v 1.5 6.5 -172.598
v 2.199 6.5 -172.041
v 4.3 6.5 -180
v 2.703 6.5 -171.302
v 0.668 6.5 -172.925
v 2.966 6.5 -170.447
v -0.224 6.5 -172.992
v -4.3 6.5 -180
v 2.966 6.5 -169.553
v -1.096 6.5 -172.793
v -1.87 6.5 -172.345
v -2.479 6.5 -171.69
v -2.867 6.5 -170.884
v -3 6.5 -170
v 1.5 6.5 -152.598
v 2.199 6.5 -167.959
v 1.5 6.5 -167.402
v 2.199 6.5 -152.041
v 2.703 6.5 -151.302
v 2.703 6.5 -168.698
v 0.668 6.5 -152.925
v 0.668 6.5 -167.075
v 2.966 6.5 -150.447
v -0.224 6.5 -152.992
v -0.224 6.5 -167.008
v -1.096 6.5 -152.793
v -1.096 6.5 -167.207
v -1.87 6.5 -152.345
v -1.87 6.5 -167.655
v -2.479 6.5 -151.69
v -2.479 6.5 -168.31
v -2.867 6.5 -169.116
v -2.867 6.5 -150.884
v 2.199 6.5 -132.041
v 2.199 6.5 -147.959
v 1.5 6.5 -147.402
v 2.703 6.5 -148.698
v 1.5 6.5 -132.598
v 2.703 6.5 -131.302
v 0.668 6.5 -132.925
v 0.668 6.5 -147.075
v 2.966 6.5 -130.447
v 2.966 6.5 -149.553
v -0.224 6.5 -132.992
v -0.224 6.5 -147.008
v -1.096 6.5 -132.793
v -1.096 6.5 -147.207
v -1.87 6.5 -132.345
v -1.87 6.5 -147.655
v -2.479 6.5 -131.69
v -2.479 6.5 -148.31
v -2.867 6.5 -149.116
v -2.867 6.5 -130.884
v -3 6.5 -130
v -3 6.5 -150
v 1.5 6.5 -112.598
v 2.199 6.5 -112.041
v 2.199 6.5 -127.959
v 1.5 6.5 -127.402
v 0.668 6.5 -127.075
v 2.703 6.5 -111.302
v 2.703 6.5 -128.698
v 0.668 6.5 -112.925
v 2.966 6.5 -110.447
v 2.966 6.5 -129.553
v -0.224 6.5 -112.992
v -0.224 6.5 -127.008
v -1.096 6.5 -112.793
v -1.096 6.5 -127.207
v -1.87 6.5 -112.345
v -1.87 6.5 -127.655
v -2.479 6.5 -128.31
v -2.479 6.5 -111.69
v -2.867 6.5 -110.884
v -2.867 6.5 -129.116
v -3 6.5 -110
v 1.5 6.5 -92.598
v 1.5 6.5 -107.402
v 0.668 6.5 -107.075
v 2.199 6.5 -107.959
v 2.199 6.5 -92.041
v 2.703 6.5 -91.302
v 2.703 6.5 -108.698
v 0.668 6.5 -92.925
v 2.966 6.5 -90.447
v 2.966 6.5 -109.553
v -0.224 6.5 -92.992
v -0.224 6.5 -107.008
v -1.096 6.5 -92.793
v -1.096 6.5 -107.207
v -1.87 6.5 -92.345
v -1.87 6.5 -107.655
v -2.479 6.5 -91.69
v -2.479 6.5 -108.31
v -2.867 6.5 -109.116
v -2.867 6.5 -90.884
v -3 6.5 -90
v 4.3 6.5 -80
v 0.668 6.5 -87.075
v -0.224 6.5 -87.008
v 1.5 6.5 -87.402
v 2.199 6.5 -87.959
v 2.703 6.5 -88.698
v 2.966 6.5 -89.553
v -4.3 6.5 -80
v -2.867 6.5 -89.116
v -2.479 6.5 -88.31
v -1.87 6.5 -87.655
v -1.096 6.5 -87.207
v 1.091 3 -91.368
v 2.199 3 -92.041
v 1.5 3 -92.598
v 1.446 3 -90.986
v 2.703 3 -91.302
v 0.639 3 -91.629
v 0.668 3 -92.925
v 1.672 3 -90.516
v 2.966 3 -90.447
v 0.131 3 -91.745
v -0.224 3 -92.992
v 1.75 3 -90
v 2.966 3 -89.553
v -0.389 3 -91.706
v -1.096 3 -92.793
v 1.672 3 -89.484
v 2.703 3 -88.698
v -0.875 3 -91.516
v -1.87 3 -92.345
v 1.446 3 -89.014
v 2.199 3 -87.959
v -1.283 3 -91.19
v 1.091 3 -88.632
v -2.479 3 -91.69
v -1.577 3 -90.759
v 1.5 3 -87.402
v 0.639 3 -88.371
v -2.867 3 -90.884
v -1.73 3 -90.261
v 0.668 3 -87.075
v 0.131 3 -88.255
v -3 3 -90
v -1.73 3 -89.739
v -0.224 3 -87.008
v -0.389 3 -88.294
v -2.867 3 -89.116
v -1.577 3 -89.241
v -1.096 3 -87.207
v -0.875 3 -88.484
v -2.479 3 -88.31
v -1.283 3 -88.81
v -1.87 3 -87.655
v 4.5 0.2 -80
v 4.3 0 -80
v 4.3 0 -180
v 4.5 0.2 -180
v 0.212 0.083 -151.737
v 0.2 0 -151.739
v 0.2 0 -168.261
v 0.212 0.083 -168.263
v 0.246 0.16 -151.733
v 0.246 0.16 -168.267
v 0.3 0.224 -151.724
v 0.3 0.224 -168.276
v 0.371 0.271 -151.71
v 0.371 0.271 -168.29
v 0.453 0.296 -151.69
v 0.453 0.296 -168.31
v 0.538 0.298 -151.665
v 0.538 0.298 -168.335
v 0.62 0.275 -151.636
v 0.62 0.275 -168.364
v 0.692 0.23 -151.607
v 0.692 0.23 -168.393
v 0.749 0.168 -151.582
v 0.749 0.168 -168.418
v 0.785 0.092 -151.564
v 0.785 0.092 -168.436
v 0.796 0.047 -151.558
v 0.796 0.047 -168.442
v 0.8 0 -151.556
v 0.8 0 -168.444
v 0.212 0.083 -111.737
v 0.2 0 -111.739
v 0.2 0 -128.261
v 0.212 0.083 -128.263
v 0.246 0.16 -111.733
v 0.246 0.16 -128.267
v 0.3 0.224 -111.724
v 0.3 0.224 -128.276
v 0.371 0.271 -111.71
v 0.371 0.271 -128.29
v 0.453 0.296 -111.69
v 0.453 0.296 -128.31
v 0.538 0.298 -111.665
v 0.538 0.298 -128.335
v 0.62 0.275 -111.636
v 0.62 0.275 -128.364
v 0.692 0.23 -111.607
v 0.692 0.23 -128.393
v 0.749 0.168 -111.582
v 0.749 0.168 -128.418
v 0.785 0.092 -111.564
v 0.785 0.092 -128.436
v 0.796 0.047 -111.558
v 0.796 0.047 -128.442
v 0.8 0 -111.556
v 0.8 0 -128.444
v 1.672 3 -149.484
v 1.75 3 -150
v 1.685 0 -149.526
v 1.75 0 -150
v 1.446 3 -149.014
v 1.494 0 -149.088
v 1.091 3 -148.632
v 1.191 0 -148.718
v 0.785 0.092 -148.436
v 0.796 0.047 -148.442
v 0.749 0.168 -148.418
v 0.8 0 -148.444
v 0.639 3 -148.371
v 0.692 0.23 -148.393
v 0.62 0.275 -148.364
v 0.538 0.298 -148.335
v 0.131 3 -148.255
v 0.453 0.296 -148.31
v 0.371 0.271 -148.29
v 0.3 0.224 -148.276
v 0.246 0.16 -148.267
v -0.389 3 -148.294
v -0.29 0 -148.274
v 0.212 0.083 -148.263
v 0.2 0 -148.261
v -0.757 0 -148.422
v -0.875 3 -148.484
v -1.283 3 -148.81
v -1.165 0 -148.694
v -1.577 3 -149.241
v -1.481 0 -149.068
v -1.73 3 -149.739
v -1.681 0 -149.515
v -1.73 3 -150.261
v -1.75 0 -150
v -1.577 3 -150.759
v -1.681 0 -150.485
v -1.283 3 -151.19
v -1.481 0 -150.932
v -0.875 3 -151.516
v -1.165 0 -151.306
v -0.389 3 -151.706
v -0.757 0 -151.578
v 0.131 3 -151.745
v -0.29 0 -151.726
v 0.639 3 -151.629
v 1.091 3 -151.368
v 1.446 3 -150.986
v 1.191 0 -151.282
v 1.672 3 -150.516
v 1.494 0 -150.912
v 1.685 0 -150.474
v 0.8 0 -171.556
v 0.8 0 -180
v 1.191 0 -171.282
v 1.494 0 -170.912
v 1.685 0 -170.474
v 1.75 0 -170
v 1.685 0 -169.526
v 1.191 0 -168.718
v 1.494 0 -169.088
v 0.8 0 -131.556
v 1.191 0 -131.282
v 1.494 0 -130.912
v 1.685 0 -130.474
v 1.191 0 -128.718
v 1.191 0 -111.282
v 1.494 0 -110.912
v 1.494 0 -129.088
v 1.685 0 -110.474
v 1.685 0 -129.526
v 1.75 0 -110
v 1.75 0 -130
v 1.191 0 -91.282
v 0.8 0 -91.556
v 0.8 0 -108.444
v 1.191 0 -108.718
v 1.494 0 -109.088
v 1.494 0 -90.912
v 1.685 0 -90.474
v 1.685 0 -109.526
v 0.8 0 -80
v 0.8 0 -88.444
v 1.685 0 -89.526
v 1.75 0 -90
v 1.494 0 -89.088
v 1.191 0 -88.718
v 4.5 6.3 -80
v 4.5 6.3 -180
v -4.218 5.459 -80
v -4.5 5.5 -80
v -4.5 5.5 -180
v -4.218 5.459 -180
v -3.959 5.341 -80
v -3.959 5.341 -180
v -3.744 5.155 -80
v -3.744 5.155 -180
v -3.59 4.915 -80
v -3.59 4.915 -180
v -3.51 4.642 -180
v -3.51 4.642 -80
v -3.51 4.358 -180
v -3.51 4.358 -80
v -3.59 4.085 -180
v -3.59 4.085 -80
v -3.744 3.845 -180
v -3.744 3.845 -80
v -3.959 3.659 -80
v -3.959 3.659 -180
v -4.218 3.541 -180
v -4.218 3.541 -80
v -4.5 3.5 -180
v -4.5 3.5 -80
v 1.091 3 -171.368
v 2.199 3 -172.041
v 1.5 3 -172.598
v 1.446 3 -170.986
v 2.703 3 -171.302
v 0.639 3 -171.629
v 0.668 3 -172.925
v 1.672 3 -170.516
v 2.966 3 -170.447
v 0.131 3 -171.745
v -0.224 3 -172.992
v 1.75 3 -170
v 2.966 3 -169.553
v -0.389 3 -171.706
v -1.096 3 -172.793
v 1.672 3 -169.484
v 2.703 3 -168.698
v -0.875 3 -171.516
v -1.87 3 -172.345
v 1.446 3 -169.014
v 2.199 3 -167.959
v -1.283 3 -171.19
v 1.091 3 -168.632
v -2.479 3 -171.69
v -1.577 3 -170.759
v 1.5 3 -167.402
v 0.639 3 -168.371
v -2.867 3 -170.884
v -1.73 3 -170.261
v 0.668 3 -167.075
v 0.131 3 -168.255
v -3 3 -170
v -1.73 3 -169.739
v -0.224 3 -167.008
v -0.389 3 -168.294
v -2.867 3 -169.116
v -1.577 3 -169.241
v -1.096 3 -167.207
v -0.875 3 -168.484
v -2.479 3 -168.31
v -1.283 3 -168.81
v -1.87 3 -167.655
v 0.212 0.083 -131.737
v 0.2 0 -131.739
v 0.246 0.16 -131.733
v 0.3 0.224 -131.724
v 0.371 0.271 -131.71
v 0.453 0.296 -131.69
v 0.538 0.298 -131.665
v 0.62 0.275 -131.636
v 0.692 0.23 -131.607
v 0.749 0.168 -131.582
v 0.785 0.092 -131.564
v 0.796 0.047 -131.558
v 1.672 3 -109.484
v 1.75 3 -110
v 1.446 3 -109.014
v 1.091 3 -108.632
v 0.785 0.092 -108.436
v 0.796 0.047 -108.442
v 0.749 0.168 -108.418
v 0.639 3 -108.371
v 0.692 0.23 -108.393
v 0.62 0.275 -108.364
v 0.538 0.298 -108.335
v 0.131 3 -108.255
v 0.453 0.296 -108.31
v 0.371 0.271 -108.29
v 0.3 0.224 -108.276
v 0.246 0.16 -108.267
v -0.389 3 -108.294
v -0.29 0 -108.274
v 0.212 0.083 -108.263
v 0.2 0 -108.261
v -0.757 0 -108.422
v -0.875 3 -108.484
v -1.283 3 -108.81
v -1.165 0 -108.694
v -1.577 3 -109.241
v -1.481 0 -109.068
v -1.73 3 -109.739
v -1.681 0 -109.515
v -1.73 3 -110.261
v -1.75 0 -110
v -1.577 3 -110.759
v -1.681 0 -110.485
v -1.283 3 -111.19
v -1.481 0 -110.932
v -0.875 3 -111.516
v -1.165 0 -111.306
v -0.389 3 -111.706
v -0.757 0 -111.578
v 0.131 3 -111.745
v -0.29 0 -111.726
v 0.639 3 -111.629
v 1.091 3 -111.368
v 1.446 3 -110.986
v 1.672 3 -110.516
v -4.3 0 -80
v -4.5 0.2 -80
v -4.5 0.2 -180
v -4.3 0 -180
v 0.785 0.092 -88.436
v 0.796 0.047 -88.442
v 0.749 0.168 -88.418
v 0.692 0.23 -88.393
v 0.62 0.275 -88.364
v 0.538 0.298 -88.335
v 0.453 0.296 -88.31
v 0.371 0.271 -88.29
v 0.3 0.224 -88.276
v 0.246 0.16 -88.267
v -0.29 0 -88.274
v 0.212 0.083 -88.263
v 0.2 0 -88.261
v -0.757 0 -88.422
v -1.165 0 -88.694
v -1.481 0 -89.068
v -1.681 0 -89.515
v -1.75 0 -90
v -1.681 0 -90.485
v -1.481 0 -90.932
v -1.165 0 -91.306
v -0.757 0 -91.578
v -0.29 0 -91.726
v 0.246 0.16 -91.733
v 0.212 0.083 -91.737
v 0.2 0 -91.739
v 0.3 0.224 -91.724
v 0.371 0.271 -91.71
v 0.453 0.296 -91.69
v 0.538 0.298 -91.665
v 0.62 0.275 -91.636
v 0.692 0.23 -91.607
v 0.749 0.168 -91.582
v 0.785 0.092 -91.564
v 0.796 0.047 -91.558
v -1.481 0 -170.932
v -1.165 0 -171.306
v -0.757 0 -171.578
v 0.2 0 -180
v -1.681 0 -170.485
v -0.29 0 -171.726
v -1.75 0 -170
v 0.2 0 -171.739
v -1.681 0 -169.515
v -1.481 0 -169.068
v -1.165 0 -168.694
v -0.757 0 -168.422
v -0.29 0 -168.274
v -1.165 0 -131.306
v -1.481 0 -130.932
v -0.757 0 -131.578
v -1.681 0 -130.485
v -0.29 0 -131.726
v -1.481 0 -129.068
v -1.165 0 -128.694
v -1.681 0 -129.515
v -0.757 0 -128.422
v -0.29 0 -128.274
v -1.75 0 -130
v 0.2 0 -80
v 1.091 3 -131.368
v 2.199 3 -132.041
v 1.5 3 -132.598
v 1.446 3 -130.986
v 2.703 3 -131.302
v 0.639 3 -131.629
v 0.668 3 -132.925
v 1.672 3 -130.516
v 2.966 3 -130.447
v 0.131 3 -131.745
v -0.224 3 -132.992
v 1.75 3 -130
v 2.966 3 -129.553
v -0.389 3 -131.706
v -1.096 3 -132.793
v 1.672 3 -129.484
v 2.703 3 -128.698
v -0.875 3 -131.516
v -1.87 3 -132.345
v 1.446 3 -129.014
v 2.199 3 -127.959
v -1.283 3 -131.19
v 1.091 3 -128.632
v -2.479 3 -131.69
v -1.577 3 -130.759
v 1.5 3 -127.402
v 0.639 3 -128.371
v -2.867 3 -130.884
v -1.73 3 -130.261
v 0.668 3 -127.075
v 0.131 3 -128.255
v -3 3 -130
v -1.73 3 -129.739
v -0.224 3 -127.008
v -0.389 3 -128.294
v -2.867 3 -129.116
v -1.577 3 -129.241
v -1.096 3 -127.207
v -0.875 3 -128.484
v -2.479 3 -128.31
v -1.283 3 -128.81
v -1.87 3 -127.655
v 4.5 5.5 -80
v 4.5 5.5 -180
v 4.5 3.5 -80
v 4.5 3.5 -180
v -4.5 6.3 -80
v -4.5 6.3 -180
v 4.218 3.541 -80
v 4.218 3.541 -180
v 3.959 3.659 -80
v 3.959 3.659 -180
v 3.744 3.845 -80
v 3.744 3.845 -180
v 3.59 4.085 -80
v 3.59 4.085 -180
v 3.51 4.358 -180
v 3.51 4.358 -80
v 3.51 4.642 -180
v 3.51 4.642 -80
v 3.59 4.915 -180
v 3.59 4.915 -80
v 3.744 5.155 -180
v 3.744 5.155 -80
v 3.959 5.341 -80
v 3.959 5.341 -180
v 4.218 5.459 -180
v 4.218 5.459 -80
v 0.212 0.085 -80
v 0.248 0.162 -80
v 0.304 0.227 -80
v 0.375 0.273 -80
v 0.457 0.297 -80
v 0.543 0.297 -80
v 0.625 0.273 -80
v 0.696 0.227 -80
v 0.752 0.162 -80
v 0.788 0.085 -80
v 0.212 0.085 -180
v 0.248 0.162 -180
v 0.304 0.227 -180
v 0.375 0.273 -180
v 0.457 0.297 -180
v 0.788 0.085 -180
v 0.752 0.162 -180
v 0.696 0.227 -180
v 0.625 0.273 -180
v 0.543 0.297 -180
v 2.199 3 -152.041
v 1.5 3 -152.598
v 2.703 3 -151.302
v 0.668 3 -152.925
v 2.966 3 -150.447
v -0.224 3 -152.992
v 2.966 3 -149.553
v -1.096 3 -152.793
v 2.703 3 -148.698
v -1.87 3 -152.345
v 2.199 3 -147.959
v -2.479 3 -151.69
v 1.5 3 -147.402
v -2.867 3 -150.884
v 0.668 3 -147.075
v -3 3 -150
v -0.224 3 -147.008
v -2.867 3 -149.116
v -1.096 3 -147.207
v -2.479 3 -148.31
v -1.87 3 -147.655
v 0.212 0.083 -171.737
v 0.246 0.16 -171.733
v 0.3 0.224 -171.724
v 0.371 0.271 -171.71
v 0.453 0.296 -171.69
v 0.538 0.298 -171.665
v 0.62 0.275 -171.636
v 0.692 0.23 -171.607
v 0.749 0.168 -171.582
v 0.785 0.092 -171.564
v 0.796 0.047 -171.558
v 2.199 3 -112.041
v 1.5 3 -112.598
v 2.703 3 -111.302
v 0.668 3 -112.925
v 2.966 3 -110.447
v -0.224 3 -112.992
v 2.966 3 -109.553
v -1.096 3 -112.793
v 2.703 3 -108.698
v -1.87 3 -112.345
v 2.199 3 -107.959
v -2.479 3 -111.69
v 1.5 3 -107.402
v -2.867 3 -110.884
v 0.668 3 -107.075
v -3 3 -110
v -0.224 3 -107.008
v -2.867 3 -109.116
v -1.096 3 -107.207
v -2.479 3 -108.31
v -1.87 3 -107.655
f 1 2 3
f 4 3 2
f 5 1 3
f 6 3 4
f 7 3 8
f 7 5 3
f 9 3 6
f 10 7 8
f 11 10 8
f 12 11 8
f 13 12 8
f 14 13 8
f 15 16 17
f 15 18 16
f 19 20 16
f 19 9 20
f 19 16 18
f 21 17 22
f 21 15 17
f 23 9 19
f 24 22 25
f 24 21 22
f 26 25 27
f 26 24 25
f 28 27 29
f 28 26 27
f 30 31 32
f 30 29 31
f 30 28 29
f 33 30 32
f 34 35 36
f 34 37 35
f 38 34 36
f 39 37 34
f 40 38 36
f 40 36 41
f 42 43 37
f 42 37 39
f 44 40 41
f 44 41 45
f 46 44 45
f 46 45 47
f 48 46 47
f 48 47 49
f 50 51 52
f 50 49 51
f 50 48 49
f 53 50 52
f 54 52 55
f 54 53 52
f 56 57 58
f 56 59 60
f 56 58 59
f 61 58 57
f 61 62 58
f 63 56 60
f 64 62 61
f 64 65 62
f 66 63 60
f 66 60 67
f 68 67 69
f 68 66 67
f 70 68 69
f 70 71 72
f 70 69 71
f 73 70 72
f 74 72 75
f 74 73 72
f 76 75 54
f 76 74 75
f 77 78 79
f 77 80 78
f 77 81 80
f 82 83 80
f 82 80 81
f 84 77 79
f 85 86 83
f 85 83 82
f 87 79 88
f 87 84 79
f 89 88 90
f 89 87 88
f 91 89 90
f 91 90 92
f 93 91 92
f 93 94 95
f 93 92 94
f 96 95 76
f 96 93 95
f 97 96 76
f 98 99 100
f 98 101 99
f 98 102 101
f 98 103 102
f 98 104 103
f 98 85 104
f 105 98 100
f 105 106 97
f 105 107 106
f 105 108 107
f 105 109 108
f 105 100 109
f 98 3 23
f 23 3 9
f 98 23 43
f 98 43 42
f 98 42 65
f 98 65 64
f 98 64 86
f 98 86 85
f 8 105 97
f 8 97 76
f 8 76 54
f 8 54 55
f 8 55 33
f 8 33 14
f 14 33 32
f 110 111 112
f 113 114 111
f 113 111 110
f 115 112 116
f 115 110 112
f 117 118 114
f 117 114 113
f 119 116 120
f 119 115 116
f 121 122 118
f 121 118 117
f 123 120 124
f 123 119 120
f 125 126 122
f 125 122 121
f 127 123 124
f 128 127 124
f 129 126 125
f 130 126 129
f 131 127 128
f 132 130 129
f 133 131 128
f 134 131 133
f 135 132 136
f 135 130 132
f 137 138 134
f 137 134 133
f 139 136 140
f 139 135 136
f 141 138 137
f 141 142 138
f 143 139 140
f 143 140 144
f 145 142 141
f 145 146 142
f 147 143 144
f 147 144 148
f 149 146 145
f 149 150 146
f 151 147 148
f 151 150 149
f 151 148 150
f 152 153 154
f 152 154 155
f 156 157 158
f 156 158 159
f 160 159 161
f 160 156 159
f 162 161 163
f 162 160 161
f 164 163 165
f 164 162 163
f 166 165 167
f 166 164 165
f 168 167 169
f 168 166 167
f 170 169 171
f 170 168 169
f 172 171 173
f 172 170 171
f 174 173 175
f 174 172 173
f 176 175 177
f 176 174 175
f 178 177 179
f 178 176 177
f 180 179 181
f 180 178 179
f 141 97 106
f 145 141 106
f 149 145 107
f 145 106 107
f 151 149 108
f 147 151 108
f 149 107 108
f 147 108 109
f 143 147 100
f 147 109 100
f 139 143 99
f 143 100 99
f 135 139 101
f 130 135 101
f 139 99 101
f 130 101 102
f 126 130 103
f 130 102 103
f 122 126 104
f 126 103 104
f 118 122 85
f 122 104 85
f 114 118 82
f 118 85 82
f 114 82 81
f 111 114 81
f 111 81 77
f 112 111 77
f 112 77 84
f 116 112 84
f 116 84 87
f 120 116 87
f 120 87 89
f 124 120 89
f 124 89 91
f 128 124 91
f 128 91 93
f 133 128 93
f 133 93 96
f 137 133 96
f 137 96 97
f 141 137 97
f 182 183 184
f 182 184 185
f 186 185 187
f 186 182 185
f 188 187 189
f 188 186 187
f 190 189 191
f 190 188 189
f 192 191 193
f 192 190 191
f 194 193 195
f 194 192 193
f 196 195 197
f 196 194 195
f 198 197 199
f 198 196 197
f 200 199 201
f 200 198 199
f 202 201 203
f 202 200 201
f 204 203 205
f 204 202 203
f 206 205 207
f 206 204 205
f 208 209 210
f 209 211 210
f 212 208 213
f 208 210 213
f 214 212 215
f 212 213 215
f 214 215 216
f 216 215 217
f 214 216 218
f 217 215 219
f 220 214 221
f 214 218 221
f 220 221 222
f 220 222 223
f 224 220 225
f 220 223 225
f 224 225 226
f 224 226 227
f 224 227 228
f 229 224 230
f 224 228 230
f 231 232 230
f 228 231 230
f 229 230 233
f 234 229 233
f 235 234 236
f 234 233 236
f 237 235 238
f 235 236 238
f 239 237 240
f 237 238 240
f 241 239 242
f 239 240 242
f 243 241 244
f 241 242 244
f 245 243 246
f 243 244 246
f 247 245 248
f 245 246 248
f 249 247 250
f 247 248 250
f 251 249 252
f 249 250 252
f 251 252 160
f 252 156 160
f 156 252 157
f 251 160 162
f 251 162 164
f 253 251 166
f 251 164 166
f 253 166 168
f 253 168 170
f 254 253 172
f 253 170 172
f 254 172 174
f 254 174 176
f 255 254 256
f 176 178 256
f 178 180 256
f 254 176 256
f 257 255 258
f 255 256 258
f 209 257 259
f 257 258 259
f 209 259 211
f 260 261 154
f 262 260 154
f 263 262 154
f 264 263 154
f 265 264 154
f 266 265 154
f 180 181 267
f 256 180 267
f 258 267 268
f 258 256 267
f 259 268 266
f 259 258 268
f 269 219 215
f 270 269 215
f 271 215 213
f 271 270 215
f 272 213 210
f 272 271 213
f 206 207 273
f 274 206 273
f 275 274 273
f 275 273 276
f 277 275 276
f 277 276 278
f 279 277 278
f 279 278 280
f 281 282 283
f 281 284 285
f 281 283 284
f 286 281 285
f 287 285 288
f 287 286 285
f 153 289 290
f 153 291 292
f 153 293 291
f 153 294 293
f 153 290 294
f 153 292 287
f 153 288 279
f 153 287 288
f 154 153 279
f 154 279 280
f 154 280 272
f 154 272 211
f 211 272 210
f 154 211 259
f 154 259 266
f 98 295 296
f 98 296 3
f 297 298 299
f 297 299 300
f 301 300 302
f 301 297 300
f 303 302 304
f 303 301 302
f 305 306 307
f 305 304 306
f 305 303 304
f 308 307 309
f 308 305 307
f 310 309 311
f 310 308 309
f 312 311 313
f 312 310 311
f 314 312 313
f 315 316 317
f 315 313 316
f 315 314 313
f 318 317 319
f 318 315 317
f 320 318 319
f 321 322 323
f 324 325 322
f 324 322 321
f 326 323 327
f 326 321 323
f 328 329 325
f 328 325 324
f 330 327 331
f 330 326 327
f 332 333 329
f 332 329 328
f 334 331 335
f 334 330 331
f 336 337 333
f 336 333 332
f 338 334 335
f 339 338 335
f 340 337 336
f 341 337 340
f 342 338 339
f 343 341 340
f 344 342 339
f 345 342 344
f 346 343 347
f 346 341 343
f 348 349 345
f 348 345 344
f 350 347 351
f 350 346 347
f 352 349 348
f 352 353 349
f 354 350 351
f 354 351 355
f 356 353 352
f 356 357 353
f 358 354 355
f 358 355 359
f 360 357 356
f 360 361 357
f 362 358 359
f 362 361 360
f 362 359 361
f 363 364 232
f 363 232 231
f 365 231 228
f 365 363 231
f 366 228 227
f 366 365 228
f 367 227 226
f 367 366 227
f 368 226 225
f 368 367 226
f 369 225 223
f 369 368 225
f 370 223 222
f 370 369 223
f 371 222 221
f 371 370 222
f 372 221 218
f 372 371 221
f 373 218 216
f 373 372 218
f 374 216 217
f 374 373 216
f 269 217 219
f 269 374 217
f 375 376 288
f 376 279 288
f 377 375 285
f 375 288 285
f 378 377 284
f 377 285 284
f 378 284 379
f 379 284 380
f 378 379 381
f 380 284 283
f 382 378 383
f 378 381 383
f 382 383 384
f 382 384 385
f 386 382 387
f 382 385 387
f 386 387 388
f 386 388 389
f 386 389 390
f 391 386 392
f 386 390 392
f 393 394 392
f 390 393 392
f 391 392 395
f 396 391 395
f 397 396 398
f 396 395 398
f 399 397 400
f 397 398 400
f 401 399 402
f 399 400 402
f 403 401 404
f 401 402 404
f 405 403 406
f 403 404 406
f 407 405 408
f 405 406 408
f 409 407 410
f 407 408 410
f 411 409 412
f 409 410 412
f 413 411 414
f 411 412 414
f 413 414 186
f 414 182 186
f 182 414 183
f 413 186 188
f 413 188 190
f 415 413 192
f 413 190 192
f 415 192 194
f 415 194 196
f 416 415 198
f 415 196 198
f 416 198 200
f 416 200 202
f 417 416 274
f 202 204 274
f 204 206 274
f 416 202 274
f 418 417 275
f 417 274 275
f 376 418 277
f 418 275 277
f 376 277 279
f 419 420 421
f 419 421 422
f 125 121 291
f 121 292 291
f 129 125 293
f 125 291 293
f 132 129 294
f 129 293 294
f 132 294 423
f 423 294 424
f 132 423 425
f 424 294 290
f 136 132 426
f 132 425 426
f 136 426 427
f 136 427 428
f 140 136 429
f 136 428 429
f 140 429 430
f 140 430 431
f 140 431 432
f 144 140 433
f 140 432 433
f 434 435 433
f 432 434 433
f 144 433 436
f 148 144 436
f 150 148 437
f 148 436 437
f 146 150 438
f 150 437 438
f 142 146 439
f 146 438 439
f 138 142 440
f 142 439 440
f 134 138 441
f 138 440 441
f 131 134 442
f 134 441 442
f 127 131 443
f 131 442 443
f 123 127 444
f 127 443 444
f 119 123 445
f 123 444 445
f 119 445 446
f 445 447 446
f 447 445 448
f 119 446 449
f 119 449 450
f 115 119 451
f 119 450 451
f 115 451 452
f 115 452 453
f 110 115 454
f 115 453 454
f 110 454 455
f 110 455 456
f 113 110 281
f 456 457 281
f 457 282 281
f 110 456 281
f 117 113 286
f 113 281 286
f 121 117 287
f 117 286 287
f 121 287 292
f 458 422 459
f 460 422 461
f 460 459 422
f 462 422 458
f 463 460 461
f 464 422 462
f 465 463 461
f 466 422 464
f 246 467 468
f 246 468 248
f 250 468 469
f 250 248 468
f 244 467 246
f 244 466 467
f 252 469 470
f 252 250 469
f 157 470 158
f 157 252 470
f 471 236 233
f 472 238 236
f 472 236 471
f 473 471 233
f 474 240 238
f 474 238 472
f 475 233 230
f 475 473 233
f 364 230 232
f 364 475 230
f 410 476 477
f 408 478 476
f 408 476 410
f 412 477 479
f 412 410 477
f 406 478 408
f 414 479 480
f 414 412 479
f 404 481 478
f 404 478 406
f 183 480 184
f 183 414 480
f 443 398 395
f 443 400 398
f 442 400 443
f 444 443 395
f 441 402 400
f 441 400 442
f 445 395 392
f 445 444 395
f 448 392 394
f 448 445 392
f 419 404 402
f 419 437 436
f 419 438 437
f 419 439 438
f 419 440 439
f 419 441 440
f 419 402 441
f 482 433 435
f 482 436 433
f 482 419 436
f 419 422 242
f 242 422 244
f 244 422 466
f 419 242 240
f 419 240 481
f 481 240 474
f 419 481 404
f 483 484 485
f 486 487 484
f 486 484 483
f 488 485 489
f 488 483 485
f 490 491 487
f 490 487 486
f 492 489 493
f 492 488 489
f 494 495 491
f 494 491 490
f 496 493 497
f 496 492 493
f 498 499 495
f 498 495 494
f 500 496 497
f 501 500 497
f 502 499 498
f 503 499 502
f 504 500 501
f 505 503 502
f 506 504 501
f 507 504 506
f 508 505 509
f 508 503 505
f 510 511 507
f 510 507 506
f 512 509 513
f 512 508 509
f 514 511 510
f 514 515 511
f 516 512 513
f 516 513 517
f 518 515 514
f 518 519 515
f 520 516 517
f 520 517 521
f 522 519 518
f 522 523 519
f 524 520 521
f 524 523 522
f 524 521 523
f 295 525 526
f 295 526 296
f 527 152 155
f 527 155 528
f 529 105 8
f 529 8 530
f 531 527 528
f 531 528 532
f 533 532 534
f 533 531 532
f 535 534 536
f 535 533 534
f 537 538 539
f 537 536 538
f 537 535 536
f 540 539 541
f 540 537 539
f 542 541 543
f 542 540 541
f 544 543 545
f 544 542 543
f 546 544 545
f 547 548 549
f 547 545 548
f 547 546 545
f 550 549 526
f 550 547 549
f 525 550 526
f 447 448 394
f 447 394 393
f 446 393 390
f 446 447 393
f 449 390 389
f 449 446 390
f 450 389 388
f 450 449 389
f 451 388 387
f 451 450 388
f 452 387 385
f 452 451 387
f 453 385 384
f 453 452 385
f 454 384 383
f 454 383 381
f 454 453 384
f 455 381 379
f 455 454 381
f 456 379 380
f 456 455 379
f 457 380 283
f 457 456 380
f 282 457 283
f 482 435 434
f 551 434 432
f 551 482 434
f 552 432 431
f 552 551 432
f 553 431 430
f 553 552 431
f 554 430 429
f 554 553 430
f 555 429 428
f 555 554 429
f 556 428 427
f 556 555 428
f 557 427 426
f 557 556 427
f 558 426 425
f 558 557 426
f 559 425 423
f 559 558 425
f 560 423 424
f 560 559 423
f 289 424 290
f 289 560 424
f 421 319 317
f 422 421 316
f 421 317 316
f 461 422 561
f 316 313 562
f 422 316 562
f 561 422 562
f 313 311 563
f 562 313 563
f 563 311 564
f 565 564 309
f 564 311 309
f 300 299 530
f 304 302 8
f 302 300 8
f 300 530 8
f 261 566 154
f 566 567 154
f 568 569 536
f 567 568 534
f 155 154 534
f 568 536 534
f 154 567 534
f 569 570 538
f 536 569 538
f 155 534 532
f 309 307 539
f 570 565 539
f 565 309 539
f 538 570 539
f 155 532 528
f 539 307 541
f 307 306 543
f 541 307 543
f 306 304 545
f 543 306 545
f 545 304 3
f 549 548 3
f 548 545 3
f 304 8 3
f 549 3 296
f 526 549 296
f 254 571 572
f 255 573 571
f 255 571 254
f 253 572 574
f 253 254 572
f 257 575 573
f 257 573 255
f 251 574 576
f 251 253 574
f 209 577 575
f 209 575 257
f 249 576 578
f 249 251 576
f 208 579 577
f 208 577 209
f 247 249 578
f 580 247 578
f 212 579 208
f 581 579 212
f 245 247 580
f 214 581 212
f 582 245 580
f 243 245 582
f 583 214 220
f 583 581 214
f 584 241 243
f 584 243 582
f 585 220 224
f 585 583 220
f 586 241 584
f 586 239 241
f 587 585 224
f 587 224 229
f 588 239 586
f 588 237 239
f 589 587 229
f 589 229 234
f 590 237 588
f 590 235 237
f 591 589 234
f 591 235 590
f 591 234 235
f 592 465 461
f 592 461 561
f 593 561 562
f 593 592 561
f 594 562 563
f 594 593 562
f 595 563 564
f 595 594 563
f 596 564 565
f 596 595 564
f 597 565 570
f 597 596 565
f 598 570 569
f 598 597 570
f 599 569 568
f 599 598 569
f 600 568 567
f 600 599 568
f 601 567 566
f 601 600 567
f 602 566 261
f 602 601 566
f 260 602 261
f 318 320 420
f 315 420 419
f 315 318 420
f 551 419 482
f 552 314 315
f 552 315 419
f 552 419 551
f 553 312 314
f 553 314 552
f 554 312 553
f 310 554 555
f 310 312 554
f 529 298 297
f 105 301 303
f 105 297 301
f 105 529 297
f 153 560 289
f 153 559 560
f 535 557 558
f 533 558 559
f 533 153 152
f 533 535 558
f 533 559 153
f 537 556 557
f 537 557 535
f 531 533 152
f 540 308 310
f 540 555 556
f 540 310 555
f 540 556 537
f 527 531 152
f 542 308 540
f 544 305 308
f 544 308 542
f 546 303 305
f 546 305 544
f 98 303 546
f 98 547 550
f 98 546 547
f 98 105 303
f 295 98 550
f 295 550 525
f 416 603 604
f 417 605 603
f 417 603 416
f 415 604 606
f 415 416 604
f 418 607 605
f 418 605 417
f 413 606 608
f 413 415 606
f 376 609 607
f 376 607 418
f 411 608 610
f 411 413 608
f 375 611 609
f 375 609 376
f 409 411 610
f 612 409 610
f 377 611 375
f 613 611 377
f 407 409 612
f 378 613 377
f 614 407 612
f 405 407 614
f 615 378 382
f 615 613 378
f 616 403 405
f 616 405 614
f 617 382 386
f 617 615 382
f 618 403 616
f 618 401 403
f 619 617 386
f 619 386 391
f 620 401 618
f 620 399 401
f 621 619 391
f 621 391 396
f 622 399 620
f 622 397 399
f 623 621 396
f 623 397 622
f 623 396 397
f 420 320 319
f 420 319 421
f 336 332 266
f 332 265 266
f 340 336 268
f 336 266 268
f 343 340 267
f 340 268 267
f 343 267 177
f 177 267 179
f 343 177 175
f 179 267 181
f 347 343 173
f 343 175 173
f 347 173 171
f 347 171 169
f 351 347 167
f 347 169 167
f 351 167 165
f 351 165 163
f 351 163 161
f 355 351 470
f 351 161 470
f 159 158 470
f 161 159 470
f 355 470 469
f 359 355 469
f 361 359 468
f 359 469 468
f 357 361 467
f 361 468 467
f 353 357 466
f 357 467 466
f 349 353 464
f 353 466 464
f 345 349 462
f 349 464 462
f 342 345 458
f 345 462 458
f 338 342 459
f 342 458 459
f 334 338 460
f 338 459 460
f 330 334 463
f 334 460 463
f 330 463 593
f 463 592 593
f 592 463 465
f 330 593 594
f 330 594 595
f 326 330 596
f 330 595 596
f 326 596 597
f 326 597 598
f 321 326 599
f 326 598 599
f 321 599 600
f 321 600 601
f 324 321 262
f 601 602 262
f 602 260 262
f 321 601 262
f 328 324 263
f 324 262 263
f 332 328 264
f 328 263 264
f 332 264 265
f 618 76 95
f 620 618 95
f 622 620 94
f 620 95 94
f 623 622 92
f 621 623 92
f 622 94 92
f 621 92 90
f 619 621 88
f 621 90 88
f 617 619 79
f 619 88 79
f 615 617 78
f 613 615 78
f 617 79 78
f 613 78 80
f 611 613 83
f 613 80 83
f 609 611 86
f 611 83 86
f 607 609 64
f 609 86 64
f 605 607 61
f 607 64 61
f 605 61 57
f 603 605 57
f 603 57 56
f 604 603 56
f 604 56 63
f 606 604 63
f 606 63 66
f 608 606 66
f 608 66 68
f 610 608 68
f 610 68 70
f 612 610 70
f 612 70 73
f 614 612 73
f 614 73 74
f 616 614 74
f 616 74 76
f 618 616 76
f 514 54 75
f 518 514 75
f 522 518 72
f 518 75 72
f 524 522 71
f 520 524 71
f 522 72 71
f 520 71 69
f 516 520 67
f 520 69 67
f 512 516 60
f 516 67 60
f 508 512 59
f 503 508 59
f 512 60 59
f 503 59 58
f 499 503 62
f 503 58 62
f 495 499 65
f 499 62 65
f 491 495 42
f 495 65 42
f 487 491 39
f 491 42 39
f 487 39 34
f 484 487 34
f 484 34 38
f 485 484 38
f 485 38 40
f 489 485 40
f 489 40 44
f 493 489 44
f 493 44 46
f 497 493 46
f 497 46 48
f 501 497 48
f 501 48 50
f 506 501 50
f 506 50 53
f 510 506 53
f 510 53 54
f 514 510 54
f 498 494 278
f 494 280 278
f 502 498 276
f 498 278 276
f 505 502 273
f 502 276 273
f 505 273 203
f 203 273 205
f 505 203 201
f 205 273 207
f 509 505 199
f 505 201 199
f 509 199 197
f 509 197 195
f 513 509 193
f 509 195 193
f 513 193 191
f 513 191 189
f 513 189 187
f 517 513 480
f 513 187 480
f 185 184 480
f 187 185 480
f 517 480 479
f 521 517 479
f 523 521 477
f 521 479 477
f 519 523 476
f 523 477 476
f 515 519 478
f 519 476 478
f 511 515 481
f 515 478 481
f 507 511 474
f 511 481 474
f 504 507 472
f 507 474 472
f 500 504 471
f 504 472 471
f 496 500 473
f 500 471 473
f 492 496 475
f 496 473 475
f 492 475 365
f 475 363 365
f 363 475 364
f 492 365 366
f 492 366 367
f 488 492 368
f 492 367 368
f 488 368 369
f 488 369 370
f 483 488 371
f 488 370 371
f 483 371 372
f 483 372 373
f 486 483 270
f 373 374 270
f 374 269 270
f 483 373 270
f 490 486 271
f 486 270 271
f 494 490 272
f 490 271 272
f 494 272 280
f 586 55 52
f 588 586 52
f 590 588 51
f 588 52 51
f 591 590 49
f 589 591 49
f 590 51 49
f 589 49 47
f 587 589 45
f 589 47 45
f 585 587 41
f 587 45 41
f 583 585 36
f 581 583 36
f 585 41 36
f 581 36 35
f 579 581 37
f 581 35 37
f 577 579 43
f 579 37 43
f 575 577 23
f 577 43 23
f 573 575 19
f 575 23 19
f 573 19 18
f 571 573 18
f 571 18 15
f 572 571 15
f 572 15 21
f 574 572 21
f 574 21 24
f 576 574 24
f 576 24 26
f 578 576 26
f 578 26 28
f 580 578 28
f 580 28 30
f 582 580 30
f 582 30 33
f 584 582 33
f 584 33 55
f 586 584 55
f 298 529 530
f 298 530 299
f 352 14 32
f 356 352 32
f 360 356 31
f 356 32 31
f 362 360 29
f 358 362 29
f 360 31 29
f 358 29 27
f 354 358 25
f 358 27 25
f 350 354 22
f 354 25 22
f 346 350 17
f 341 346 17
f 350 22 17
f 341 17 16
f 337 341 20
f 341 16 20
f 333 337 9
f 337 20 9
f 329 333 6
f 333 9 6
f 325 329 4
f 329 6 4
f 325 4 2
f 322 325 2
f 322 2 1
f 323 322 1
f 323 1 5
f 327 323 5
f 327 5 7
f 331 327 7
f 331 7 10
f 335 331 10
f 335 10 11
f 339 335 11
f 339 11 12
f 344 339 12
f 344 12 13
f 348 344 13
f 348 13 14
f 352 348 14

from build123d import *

# Parameters (mm, degrees)
EXTRUDE_1_DEPTH              = 220
HOLE_WIZARD_M3_1_D           = 3.5
HOLE_WIZARD_M3_1_CBORE_D     = 6
HOLE_WIZARD_M3_1_CBORE_DEPTH = 3.5
PATTERN_LINEAR_1_COUNT       = 11
PATTERN_LINEAR_1_PITCH       = 20
SKETCH_6_W                   = 1.5
SKETCH_6_H                   = 0.134615385
CUT_EXTRUDE_1_DEPTH          = 0.1
SKETCH_8_W                   = 50
SKETCH_8_H                   = 60
SKETCH_8_H_2                 = 140
CUT_EXTRUDE_2_DEPTH          = 221.14199973


with BuildPart() as part:
    # 草图1 → 凸台-拉伸1 (new body)
    with BuildSketch(Plane.XY):
        with BuildLine():
            Line((4.5, 5.5), (4.5, 6.3))
            Line((4.5, 6.3), (4.3, 6.5))
            Line((4.3, 6.5), (-4.3, 6.5))
            Line((-4.3, 6.5), (-4.5, 6.3))
            Line((-4.5, 6.3), (-4.5, 5.5))
            ThreePointArc((-4.5, 5.5), (-3.5, 4.5), (-4.5, 3.5))
            Line((-4.5, 3.5), (-4.5, 0.2))
            Line((-4.5, 0.2), (-4.3, 0))
            Line((-4.3, 0), (0.2, 0))
            ThreePointArc((0.2, 0), (0.5, 0.3), (0.8, 0))
            Line((0.8, 0), (4.3, 0))
            Line((4.3, 0), (4.5, 0.2))
            Line((4.5, 0.2), (4.5, 3.5))
            ThreePointArc((4.5, 3.5), (3.5, 4.5), (4.5, 5.5))
        make_face()
    extrude(amount=-EXTRUDE_1_DEPTH)

    # M3 六角凹头螺钉的柱形沉头孔1 (through all)
    with Locations(Plane(origin=(0.754900713, 6.5, 19.343475793), x_dir=(-1, 0, 0), z_dir=(0, 1, 0))):
        with Locations((0.754900713, -29.343475793)):
            hole_wizard_m3_1 = CounterBoreHole(HOLE_WIZARD_M3_1_D / 2, HOLE_WIZARD_M3_1_CBORE_D / 2, HOLE_WIZARD_M3_1_CBORE_DEPTH)

    # 阵列(线性)1: M3 六角凹头螺钉的柱形沉头孔1 ×11
    with Locations(*[(0, 0, -i * PATTERN_LINEAR_1_PITCH) for i in range(1, PATTERN_LINEAR_1_COUNT)]):
        add(hole_wizard_m3_1, mode=Mode.SUBTRACT)

    # 草图6 → 切除-拉伸1 (cut)
    # profile 1 of 9: a face of its own
    with BuildSketch(Plane(origin=(0, 6.5, 0), x_dir=(1, 0, 0), z_dir=(0, 1, 0))):
        Polygon((-1.5, 13.740384615), (-1.5, 13.875), (-0.884615385, 13.875), (-0.884615385, 14.644230769), (-1.5, 14.644230769), (-1.5, 14.778846154), (0, 14.778846154), (0, 14.644230769), (-0.730769231, 14.644230769), (-0.730769231, 13.875), (0, 13.875), (0, 13.740384615), align=None)
    # profile 2 of 9: a face of its own
    with BuildSketch(Plane(origin=(0, 6.5, 0), x_dir=(1, 0, 0), z_dir=(0, 1, 0))):
        with Locations((-0.75, 15.230769231)):
            Rectangle(SKETCH_6_W, SKETCH_6_H)
    # profile 3 of 9: a face of its own
    with BuildSketch(Plane(origin=(0, 6.5, 0), x_dir=(1, 0, 0), z_dir=(0, 1, 0))):
        Polygon((-1.5, 15.528846154), (-1.5, 15.66796875), (-0.399939904, 15.961538462), (-1.5, 16.398137019), (-1.5, 16.417668269), (-0.407451923, 16.846153846), (-1.5, 17.141225962), (-1.5, 17.278846154), (0, 16.874399038), (0, 16.855168269), (-1.147235577, 16.403846154), (0, 15.947115385), (0, 15.927884615), align=None)
    # profile 4 of 9: a face of its own
    with BuildSketch(Plane(origin=(0, 6.5, 0), x_dir=(1, 0, 0), z_dir=(0, 1, 0))):
        with Locations((-0.75, 17.692307693)):
            Rectangle(SKETCH_6_W, SKETCH_6_H)
    # profile 5 of 9: a face of its own
    with BuildSketch(Plane(origin=(0, 6.5, 0), x_dir=(1, 0, 0), z_dir=(0, 1, 0))):
        Polygon((0, 18.086538462), (-1.5, 18.086538462), (-1.5, 18.114783654), (-0.319411058, 19.105769231), (-1.5, 19.105769231), (-1.5, 19.240384615), (0, 19.240384615), (0, 19.209735577), (-1.177884615, 18.221153846), (0, 18.221153846), align=None)
    # profile 6 of 9: a face of its own
    with BuildSketch(Plane(origin=(0, 6.5, 0), x_dir=(1, 0, 0), z_dir=(0, 1, 0))):
        Polygon((0, 20.125), (-1.5, 20.323016827), (-1.5, 20.342247596), (-0.269230769, 20.961538462), (-1.5, 21.579326923), (-1.5, 21.598858173), (0, 21.798076923), (0, 21.662860577), (-1.079326923, 21.519230769), (0, 20.977764423), (0, 20.947415865), (-1.081730769, 20.403846154), (0, 20.260516827), align=None)
    # profile 7 of 9: a face of its own
    with BuildSketch(Plane(origin=(0, 6.5, 0), x_dir=(1, 0, 0), z_dir=(0, 1, 0))):
        with BuildLine():
            Line((-1.243990385, 23.509615385), (-1.134615385, 23.394230769))
            add(Edge.make_bspline(
                [(-1.134615385, 23.394230769), (-1.154263766, 23.373355449), (-1.193092001, 23.332102593), (-1.243390317, 23.264731189), (-1.28690443, 23.194721537), (-1.322045397, 23.121960438), (-1.349611823, 23.048355866), (-1.369650093, 22.975173457), (-1.382340162, 22.902887044), (-1.383864341, 22.854816629), (-1.384615385, 22.831129808)],
                knots=[0, 0, 0, 0, 1.089067066, 2.152164705, 3.18986567, 4.218445106, 5.218487318, 6.173592265, 7.100032889, 8, 8, 8, 8], degree=3))
            add(Edge.make_bspline(
                [(-1.384615385, 22.831129808), (-1.384438125, 22.816594936), (-1.384084065, 22.78756289), (-1.379565116, 22.7444392), (-1.373065889, 22.701767784), (-1.363662227, 22.659629195), (-1.351744059, 22.6179415), (-1.336836002, 22.576849691), (-1.319455188, 22.536277104), (-1.299371251, 22.496605953), (-1.277308532, 22.458145638), (-1.252858892, 22.42182164), (-1.226807524, 22.387400299), (-1.198496406, 22.355536353), (-1.168203133, 22.326017847), (-1.136473262, 22.298301833), (-1.102682945, 22.272904871), (-1.066971137, 22.250282454), (-1.030168657, 22.229853485), (-0.992587626, 22.212199685), (-0.954576919, 22.196852561), (-0.915850319, 22.185163721), (-0.876807084, 22.175263346), (-0.837242608, 22.168371388), (-0.797053572, 22.164472967), (-0.770140273, 22.163799899), (-0.756610577, 22.163461538)],
                knots=[0, 0, 0, 0, 1.028150113, 2.053633673, 3.06513288, 4.081487945, 5.106702018, 6.131327874, 7.172780699, 8.228344599, 9.276313556, 10.308389736, 11.324843658, 12.329040066, 13.321460474, 14.316307835, 15.308626991, 16.309440696, 17.305625405, 18.28535951, 19.246194545, 20.203493668, 21.145557131, 22.095268976, 23.042464743, 24, 24, 24, 24], degree=3))
            add(Edge.make_bspline(
                [(-0.756610577, 22.163461538), (-0.742780294, 22.163785622), (-0.715157493, 22.164432905), (-0.673930463, 22.168569989), (-0.633320499, 22.176265079), (-0.593263727, 22.186470115), (-0.553680426, 22.199444118), (-0.514611904, 22.215383767), (-0.476061961, 22.23437211), (-0.438413282, 22.256302653), (-0.401770368, 22.280520997), (-0.36696502, 22.307157219), (-0.334402283, 22.336256163), (-0.303606537, 22.367284281), (-0.274772132, 22.40052428), (-0.248246624, 22.43629865), (-0.223619847, 22.474106619), (-0.201162346, 22.513964957), (-0.181102046, 22.555452377), (-0.163263098, 22.597990847), (-0.14857199, 22.641717091), (-0.136598507, 22.686401091), (-0.126784097, 22.731989638), (-0.120470176, 22.778714125), (-0.115888391, 22.826231), (-0.11555339, 22.858261842), (-0.115384615, 22.874399038)],
                knots=[0, 0, 0, 0, 0.935915162, 1.869274651, 2.799799983, 3.730201895, 4.664668062, 5.616159355, 6.583070886, 7.570012957, 8.562524459, 9.553461134, 10.53281078, 11.515274572, 12.509912756, 13.507571325, 14.526460018, 15.561318395, 16.601025881, 17.643204557, 18.680545676, 19.719612342, 20.772381578, 21.833430283, 22.908478249, 24, 24, 24, 24], degree=3))
            add(Edge.make_bspline(
                [(-0.115384615, 22.874399038), (-0.11579098, 22.893846981), (-0.116588941, 22.932036175), (-0.122805743, 22.988172098), (-0.132502802, 23.042091792), (-0.14674811, 23.093619722), (-0.164779159, 23.142942891), (-0.187077122, 23.189879386), (-0.213407387, 23.234558812), (-0.24323677, 23.276787781), (-0.276471827, 23.315562361), (-0.312015273, 23.350851823), (-0.350327601, 23.381442662), (-0.390837822, 23.408248655), (-0.433933425, 23.430404616), (-0.479374666, 23.448595707), (-0.527189663, 23.462538188), (-0.560228886, 23.468261798), (-0.576923077, 23.471153846)],
                knots=[0, 0, 0, 0, 1.130199668, 2.219330667, 3.279027493, 4.311506524, 5.322739849, 6.327972234, 7.327472899, 8.33386792, 9.329086447, 10.29244429, 11.240784345, 12.174119183, 13.111530729, 14.052100829, 15.015757696, 16, 16, 16, 16], degree=3))
            Line((-0.576923077, 23.471153846), (-0.576923077, 22.971153846))
            Line((-0.576923077, 22.971153846), (-0.730769231, 22.971153846))
            Line((-0.730769231, 22.971153846), (-0.730769231, 23.605769231))
            add(Edge.make_bspline(
                [(-0.730769231, 23.605769231), (-0.702094593, 23.605038153), (-0.645973146, 23.603607301), (-0.564128744, 23.593570623), (-0.48682659, 23.577363547), (-0.413985274, 23.555223413), (-0.34570802, 23.526562579), (-0.281925506, 23.491688638), (-0.223049785, 23.450043443), (-0.168600212, 23.403110397), (-0.12003055, 23.350438986), (-0.077342291, 23.293452435), (-0.041384027, 23.232056591), (-0.012129457, 23.166309531), (0.010702255, 23.096426488), (0.026890073, 23.022245754), (0.036588629, 22.943867925), (0.037827792, 22.890152206), (0.038461538, 22.862680288)],
                knots=[0, 0, 0, 0, 1.140356446, 2.231883559, 3.274166699, 4.278491846, 5.25512956, 6.21435461, 7.1637429, 8.11826594, 9.068280886, 10.0076534, 10.945064095, 11.891975133, 12.864533718, 13.863980011, 14.907571808, 16, 16, 16, 16], degree=3))
            add(Edge.make_bspline(
                [(0.038461538, 22.862680288), (0.038217629, 22.845747373), (0.037736562, 22.812350207), (0.034317699, 22.763025524), (0.029054595, 22.715060829), (0.021106685, 22.668463111), (0.011371833, 22.623060964), (-0.001093904, 22.579081142), (-0.015523346, 22.53635611), (-0.031935778, 22.494819831), (-0.050952202, 22.45484931), (-0.072084905, 22.416266517), (-0.095224917, 22.378858178), (-0.120772422, 22.342879107), (-0.148536333, 22.308141841), (-0.178572299, 22.274870365), (-0.210788493, 22.242878417), (-0.233665211, 22.222838219), (-0.245192308, 22.212740385)],
                knots=[0, 0, 0, 0, 1.107784379, 2.184907829, 3.233506516, 4.263428166, 5.276301166, 6.270063455, 7.25232949, 8.225834625, 9.190232166, 10.146266622, 11.1027726, 12.066435141, 13.031522626, 14.010570082, 14.99756817, 16, 16, 16, 16], degree=3))
            add(Edge.make_bspline(
                [(-0.245192308, 22.212740385), (-0.26347973, 22.198089271), (-0.299751023, 22.169030237), (-0.357865285, 22.131625313), (-0.418037511, 22.099738997), (-0.480435209, 22.073867073), (-0.545000015, 22.053665036), (-0.611649425, 22.039176642), (-0.680469267, 22.030687804), (-0.727040094, 22.02946486), (-0.750600962, 22.028846154)],
                knots=[0, 0, 0, 0, 1.023165419, 2.029347347, 3.013907458, 3.994755782, 4.975994455, 5.96558838, 6.970761222, 8, 8, 8, 8], degree=3))
            add(Edge.make_bspline(
                [(-0.750600962, 22.028846154), (-0.768243641, 22.029074256), (-0.803304773, 22.029527561), (-0.855357904, 22.035024211), (-0.906486775, 22.042910531), (-0.956649576, 22.054502135), (-1.005879862, 22.069114786), (-1.054200296, 22.087352121), (-1.101640133, 22.108585168), (-1.147870041, 22.133266476), (-1.192287019, 22.160724506), (-1.234673706, 22.190556358), (-1.274343142, 22.222992223), (-1.311387223, 22.258126549), (-1.346354989, 22.295251091), (-1.378516018, 22.33514522), (-1.408373576, 22.377204507), (-1.435353952, 22.421754996), (-1.459597318, 22.468093695), (-1.480849352, 22.516119874), (-1.498413761, 22.565816082), (-1.513316774, 22.616810749), (-1.524337558, 22.669489669), (-1.532329875, 22.723470616), (-1.537798704, 22.779034949), (-1.538238528, 22.816593247), (-1.538461538, 22.835637019)],
                knots=[0, 0, 0, 0, 1.00895651, 2.005089799, 2.991467152, 3.967318338, 4.948153826, 5.927364234, 6.919980553, 7.91976625, 8.923240147, 9.905815003, 10.88314567, 11.851989312, 12.825009789, 13.798721852, 14.781296708, 15.773896486, 16.776076962, 17.771600213, 18.775744723, 19.78957137, 20.808953803, 21.851964491, 22.910847925, 24, 24, 24, 24], degree=3))
            add(Edge.make_bspline(
                [(-1.538461538, 22.835637019), (-1.538213185, 22.851167695), (-1.537720729, 22.8819632), (-1.534307308, 22.927788514), (-1.528897073, 22.97290552), (-1.521514165, 23.017381116), (-1.511458298, 23.061063844), (-1.499424747, 23.104078147), (-1.485413966, 23.146486377), (-1.46870446, 23.188155626), (-1.449738621, 23.229366076), (-1.428390011, 23.270346865), (-1.404293581, 23.31095797), (-1.37737778, 23.351269819), (-1.348104887, 23.391536616), (-1.315637676, 23.431121462), (-1.281256495, 23.470979867), (-1.256535559, 23.496609216), (-1.243990385, 23.509615385)],
                knots=[0, 0, 0, 0, 0.985871117, 1.954866573, 2.915460327, 3.869826059, 4.81536089, 5.759505086, 6.70452669, 7.649098992, 8.607881297, 9.583363685, 10.581137262, 11.603961102, 12.659522466, 13.73993555, 14.853081303, 16, 16, 16, 16], degree=3))
        make_face()
    # profile 8 of 9: a face of its own
    with BuildSketch(Plane(origin=(0, 6.5, 0), x_dir=(1, 0, 0), z_dir=(0, 1, 0))):
        Polygon((0, 23.913461538), (-1.5, 23.913461538), (-1.5, 23.941706731), (-0.319411058, 24.932692308), (-1.5, 24.932692308), (-1.5, 25.067307692), (0, 25.067307692), (0, 25.036658654), (-1.177884615, 24.048076923), (0, 24.048076923), align=None)
    # profile 9 of 9: a face of its own
    with BuildSketch(Plane(origin=(0, 6.5, 0), x_dir=(1, 0, 0), z_dir=(0, 1, 0))):
        with BuildLine():
            Line((0.038461538, 25.644230769), (-0.036358173, 25.536658654))
            Line((-0.036358173, 25.536658654), (-0.646033654, 25.953725962))
            add(Edge.make_bspline(
                [(-0.646033654, 25.953725962), (-0.642627639, 25.927119325), (-0.635922786, 25.874743285), (-0.635046516, 25.821948826), (-0.634615385, 25.795973558)],
                knots=[0, 0, 0, 0, 1.015985029, 2, 2, 2, 2], degree=3))
            add(Edge.make_bspline(
                [(-0.634615385, 25.795973558), (-0.635018703, 25.780226966), (-0.635810382, 25.749317783), (-0.642085443, 25.703875646), (-0.651749784, 25.660210407), (-0.666170676, 25.61843782), (-0.684092777, 25.578400913), (-0.706317169, 25.540186946), (-0.732462883, 25.503847908), (-0.762390698, 25.469771994), (-0.79525498, 25.438786105), (-0.830027824, 25.411158608), (-0.867084601, 25.38832306), (-0.905643777, 25.369014905), (-0.946528356, 25.354782526), (-0.989044603, 25.344167996), (-1.033456433, 25.33770465), (-1.063680548, 25.336931181), (-1.079026442, 25.336538462)],
                knots=[0, 0, 0, 0, 1.060698949, 2.082059282, 3.085738422, 4.069684654, 5.054463875, 6.037298355, 7.043153692, 8.066652628, 9.088369706, 10.083456696, 11.053578809, 12.016466116, 12.983507685, 13.964045196, 14.966270913, 16, 16, 16, 16], degree=3))
            add(Edge.make_bspline(
                [(-1.079026442, 25.336538462), (-1.100012199, 25.337283285), (-1.141202981, 25.338745222), (-1.201400397, 25.350466182), (-1.258351131, 25.369885651), (-1.3119915, 25.396537862), (-1.361089385, 25.43075081), (-1.405478439, 25.47138122), (-1.444366827, 25.518757479), (-1.477757084, 25.571642671), (-1.504794475, 25.628718475), (-1.524003389, 25.688742519), (-1.536274492, 25.750703662), (-1.537729379, 25.792811829), (-1.538461538, 25.814002404)],
                knots=[0, 0, 0, 0, 1.023011052, 2.007963168, 2.978169221, 3.950402619, 4.919353283, 5.887490769, 6.876420893, 7.899700203, 8.931203047, 9.947778163, 10.96723692, 12, 12, 12, 12], degree=3))
            add(Edge.make_bspline(
                [(-1.538461538, 25.814002404), (-1.537677179, 25.834783148), (-1.536127357, 25.875843941), (-1.524777147, 25.936225043), (-1.505646911, 25.994056533), (-1.479211547, 26.04902008), (-1.446070758, 26.099903164), (-1.406596454, 26.145683388), (-1.360755672, 26.185145911), (-1.309807647, 26.21879079), (-1.25472961, 26.245295182), (-1.197347446, 26.264716171), (-1.138006313, 26.276587527), (-1.097810064, 26.2780886), (-1.077524038, 26.278846154)],
                knots=[0, 0, 0, 0, 1.026358223, 2.027987109, 3.023239252, 4.028077889, 5.032770297, 6.015020143, 7.004250571, 8.011656937, 9.02310243, 10.015224881, 10.998334443, 12, 12, 12, 12], degree=3))
            add(Edge.make_bspline(
                [(-1.077524038, 26.278846154), (-1.061777289, 26.278338872), (-1.029838946, 26.277309978), (-0.981399024, 26.270187018), (-0.932048608, 26.257900384), (-0.890237555, 26.244171772), (-0.855599349, 26.230715419), (-0.828157364, 26.218414328), (-0.799474135, 26.204124912), (-0.769432207, 26.188166246), (-0.737992383, 26.170568563), (-0.705372722, 26.150853478), (-0.671525668, 26.129286907), (-0.648704972, 26.113932306), (-0.637019231, 26.106069712)],
                knots=[0, 0, 0, 0, 1.179894106, 2.393120058, 3.660107319, 4.986885617, 5.687958251, 6.443931318, 7.239444731, 8.088894906, 8.992865148, 9.938946712, 10.944601238, 12, 12, 12, 12], degree=3))
            Line((-0.637019231, 26.106069712), (0.038461538, 25.644230769))
        make_face()
        with BuildLine():
            add(Edge.make_bspline(
                [(-0.788461538, 25.820913462), (-0.788788092, 25.832842038), (-0.789423782, 25.856062922), (-0.793275522, 25.890085737), (-0.800155229, 25.922181807), (-0.809870336, 25.952557703), (-0.822177437, 25.981176653), (-0.837175655, 26.008047671), (-0.855193568, 26.032896281), (-0.875446063, 26.05581095), (-0.897641992, 26.076606708), (-0.92142287, 26.094537445), (-0.946049906, 26.110062218), (-0.972027251, 26.122447516), (-0.998929945, 26.132428799), (-1.027147055, 26.139393389), (-1.056483756, 26.143240028), (-1.076411522, 26.143896939), (-1.086538462, 26.144230769)],
                knots=[0, 0, 0, 0, 1.163726718, 2.265380301, 3.334713825, 4.36057981, 5.371541381, 6.368955992, 7.355979581, 8.359691305, 9.348261197, 10.317521986, 11.261029684, 12.183096459, 13.119698615, 14.055740009, 15.011961376, 16, 16, 16, 16], degree=3))
            add(Edge.make_bspline(
                [(-1.086538462, 26.144230769), (-1.096669885, 26.143944046), (-1.116635099, 26.143379024), (-1.146011565, 26.138837612), (-1.174173238, 26.130870253), (-1.201311834, 26.120071794), (-1.227278993, 26.10611642), (-1.252156559, 26.089207568), (-1.27556797, 26.06878977), (-1.297899065, 26.04597379), (-1.318157147, 26.020878942), (-1.336055672, 25.994290795), (-1.351161049, 25.966351386), (-1.363089133, 25.93693608), (-1.37286104, 25.906444325), (-1.379778661, 25.87456046), (-1.383632614, 25.841240421), (-1.384283622, 25.818619358), (-1.384615385, 25.807091346)],
                knots=[0, 0, 0, 0, 0.971910406, 1.91526867, 2.84337505, 3.775008003, 4.712374136, 5.666733183, 6.654995996, 7.688089235, 8.726800303, 9.745078658, 10.75990398, 11.768337501, 12.786615857, 13.829099629, 14.893678693, 16, 16, 16, 16], degree=3))
            add(Edge.make_bspline(
                [(-1.384615385, 25.807091346), (-1.384283077, 25.795663594), (-1.383631091, 25.773242439), (-1.379786064, 25.740218598), (-1.372814047, 25.708550372), (-1.363093561, 25.678147127), (-1.351160136, 25.648732673), (-1.336054875, 25.620794582), (-1.318161301, 25.594200241), (-1.297882935, 25.569129265), (-1.275672102, 25.546272163), (-1.252051947, 25.526199864), (-1.227292163, 25.509252774), (-1.201308356, 25.495316895), (-1.174174163, 25.48451328), (-1.146011315, 25.476547297), (-1.116635164, 25.472005515), (-1.096669907, 25.471440543), (-1.086538462, 25.471153846)],
                knots=[0, 0, 0, 0, 1.099107991, 2.156440826, 3.191784126, 4.212280276, 5.222910149, 6.239945746, 7.260441896, 8.30141526, 9.33675856, 10.320924759, 11.277362386, 12.216770088, 13.150432123, 14.080559904, 15.025972789, 16, 16, 16, 16], degree=3))
            add(Edge.make_bspline(
                [(-1.086538462, 25.471153846), (-1.076403667, 25.471413811), (-1.056415996, 25.471926509), (-1.02704542, 25.476862927), (-0.998901248, 25.485140198), (-0.971743232, 25.496115903), (-0.945922725, 25.510845615), (-0.921305837, 25.528746476), (-0.897389308, 25.549401013), (-0.875515463, 25.573486122), (-0.855096635, 25.599349364), (-0.837288944, 25.627129241), (-0.822356647, 25.656267501), (-0.809834058, 25.686577057), (-0.800253227, 25.718284705), (-0.793288301, 25.751346293), (-0.789460709, 25.785767775), (-0.788797791, 25.809085836), (-0.788461538, 25.820913462)],
                knots=[0, 0, 0, 0, 0.952872936, 1.879239831, 2.791748947, 3.708674669, 4.628500839, 5.580394867, 6.568761142, 7.595635223, 8.636123962, 9.665976811, 10.694276597, 11.712685318, 12.747011694, 13.805940053, 14.887106426, 16, 16, 16, 16], degree=3))
        make_face(mode=Mode.SUBTRACT)
    extrude(amount=-CUT_EXTRUDE_1_DEPTH, mode=Mode.SUBTRACT)

    # 草图8 → 切除-拉伸2 (cut, through all)
    with BuildSketch(Plane(origin=(0, 6.5, 0), x_dir=(1, 0, 0), z_dir=(0, 1, 0))):
        with Locations((0, 210)):
            Rectangle(SKETCH_8_W, SKETCH_8_H)
        with Locations((0, 10)):
            Rectangle(SKETCH_8_W, SKETCH_8_H_2)
    extrude(amount=-CUT_EXTRUDE_2_DEPTH, mode=Mode.SUBTRACT)


solid = part.part
